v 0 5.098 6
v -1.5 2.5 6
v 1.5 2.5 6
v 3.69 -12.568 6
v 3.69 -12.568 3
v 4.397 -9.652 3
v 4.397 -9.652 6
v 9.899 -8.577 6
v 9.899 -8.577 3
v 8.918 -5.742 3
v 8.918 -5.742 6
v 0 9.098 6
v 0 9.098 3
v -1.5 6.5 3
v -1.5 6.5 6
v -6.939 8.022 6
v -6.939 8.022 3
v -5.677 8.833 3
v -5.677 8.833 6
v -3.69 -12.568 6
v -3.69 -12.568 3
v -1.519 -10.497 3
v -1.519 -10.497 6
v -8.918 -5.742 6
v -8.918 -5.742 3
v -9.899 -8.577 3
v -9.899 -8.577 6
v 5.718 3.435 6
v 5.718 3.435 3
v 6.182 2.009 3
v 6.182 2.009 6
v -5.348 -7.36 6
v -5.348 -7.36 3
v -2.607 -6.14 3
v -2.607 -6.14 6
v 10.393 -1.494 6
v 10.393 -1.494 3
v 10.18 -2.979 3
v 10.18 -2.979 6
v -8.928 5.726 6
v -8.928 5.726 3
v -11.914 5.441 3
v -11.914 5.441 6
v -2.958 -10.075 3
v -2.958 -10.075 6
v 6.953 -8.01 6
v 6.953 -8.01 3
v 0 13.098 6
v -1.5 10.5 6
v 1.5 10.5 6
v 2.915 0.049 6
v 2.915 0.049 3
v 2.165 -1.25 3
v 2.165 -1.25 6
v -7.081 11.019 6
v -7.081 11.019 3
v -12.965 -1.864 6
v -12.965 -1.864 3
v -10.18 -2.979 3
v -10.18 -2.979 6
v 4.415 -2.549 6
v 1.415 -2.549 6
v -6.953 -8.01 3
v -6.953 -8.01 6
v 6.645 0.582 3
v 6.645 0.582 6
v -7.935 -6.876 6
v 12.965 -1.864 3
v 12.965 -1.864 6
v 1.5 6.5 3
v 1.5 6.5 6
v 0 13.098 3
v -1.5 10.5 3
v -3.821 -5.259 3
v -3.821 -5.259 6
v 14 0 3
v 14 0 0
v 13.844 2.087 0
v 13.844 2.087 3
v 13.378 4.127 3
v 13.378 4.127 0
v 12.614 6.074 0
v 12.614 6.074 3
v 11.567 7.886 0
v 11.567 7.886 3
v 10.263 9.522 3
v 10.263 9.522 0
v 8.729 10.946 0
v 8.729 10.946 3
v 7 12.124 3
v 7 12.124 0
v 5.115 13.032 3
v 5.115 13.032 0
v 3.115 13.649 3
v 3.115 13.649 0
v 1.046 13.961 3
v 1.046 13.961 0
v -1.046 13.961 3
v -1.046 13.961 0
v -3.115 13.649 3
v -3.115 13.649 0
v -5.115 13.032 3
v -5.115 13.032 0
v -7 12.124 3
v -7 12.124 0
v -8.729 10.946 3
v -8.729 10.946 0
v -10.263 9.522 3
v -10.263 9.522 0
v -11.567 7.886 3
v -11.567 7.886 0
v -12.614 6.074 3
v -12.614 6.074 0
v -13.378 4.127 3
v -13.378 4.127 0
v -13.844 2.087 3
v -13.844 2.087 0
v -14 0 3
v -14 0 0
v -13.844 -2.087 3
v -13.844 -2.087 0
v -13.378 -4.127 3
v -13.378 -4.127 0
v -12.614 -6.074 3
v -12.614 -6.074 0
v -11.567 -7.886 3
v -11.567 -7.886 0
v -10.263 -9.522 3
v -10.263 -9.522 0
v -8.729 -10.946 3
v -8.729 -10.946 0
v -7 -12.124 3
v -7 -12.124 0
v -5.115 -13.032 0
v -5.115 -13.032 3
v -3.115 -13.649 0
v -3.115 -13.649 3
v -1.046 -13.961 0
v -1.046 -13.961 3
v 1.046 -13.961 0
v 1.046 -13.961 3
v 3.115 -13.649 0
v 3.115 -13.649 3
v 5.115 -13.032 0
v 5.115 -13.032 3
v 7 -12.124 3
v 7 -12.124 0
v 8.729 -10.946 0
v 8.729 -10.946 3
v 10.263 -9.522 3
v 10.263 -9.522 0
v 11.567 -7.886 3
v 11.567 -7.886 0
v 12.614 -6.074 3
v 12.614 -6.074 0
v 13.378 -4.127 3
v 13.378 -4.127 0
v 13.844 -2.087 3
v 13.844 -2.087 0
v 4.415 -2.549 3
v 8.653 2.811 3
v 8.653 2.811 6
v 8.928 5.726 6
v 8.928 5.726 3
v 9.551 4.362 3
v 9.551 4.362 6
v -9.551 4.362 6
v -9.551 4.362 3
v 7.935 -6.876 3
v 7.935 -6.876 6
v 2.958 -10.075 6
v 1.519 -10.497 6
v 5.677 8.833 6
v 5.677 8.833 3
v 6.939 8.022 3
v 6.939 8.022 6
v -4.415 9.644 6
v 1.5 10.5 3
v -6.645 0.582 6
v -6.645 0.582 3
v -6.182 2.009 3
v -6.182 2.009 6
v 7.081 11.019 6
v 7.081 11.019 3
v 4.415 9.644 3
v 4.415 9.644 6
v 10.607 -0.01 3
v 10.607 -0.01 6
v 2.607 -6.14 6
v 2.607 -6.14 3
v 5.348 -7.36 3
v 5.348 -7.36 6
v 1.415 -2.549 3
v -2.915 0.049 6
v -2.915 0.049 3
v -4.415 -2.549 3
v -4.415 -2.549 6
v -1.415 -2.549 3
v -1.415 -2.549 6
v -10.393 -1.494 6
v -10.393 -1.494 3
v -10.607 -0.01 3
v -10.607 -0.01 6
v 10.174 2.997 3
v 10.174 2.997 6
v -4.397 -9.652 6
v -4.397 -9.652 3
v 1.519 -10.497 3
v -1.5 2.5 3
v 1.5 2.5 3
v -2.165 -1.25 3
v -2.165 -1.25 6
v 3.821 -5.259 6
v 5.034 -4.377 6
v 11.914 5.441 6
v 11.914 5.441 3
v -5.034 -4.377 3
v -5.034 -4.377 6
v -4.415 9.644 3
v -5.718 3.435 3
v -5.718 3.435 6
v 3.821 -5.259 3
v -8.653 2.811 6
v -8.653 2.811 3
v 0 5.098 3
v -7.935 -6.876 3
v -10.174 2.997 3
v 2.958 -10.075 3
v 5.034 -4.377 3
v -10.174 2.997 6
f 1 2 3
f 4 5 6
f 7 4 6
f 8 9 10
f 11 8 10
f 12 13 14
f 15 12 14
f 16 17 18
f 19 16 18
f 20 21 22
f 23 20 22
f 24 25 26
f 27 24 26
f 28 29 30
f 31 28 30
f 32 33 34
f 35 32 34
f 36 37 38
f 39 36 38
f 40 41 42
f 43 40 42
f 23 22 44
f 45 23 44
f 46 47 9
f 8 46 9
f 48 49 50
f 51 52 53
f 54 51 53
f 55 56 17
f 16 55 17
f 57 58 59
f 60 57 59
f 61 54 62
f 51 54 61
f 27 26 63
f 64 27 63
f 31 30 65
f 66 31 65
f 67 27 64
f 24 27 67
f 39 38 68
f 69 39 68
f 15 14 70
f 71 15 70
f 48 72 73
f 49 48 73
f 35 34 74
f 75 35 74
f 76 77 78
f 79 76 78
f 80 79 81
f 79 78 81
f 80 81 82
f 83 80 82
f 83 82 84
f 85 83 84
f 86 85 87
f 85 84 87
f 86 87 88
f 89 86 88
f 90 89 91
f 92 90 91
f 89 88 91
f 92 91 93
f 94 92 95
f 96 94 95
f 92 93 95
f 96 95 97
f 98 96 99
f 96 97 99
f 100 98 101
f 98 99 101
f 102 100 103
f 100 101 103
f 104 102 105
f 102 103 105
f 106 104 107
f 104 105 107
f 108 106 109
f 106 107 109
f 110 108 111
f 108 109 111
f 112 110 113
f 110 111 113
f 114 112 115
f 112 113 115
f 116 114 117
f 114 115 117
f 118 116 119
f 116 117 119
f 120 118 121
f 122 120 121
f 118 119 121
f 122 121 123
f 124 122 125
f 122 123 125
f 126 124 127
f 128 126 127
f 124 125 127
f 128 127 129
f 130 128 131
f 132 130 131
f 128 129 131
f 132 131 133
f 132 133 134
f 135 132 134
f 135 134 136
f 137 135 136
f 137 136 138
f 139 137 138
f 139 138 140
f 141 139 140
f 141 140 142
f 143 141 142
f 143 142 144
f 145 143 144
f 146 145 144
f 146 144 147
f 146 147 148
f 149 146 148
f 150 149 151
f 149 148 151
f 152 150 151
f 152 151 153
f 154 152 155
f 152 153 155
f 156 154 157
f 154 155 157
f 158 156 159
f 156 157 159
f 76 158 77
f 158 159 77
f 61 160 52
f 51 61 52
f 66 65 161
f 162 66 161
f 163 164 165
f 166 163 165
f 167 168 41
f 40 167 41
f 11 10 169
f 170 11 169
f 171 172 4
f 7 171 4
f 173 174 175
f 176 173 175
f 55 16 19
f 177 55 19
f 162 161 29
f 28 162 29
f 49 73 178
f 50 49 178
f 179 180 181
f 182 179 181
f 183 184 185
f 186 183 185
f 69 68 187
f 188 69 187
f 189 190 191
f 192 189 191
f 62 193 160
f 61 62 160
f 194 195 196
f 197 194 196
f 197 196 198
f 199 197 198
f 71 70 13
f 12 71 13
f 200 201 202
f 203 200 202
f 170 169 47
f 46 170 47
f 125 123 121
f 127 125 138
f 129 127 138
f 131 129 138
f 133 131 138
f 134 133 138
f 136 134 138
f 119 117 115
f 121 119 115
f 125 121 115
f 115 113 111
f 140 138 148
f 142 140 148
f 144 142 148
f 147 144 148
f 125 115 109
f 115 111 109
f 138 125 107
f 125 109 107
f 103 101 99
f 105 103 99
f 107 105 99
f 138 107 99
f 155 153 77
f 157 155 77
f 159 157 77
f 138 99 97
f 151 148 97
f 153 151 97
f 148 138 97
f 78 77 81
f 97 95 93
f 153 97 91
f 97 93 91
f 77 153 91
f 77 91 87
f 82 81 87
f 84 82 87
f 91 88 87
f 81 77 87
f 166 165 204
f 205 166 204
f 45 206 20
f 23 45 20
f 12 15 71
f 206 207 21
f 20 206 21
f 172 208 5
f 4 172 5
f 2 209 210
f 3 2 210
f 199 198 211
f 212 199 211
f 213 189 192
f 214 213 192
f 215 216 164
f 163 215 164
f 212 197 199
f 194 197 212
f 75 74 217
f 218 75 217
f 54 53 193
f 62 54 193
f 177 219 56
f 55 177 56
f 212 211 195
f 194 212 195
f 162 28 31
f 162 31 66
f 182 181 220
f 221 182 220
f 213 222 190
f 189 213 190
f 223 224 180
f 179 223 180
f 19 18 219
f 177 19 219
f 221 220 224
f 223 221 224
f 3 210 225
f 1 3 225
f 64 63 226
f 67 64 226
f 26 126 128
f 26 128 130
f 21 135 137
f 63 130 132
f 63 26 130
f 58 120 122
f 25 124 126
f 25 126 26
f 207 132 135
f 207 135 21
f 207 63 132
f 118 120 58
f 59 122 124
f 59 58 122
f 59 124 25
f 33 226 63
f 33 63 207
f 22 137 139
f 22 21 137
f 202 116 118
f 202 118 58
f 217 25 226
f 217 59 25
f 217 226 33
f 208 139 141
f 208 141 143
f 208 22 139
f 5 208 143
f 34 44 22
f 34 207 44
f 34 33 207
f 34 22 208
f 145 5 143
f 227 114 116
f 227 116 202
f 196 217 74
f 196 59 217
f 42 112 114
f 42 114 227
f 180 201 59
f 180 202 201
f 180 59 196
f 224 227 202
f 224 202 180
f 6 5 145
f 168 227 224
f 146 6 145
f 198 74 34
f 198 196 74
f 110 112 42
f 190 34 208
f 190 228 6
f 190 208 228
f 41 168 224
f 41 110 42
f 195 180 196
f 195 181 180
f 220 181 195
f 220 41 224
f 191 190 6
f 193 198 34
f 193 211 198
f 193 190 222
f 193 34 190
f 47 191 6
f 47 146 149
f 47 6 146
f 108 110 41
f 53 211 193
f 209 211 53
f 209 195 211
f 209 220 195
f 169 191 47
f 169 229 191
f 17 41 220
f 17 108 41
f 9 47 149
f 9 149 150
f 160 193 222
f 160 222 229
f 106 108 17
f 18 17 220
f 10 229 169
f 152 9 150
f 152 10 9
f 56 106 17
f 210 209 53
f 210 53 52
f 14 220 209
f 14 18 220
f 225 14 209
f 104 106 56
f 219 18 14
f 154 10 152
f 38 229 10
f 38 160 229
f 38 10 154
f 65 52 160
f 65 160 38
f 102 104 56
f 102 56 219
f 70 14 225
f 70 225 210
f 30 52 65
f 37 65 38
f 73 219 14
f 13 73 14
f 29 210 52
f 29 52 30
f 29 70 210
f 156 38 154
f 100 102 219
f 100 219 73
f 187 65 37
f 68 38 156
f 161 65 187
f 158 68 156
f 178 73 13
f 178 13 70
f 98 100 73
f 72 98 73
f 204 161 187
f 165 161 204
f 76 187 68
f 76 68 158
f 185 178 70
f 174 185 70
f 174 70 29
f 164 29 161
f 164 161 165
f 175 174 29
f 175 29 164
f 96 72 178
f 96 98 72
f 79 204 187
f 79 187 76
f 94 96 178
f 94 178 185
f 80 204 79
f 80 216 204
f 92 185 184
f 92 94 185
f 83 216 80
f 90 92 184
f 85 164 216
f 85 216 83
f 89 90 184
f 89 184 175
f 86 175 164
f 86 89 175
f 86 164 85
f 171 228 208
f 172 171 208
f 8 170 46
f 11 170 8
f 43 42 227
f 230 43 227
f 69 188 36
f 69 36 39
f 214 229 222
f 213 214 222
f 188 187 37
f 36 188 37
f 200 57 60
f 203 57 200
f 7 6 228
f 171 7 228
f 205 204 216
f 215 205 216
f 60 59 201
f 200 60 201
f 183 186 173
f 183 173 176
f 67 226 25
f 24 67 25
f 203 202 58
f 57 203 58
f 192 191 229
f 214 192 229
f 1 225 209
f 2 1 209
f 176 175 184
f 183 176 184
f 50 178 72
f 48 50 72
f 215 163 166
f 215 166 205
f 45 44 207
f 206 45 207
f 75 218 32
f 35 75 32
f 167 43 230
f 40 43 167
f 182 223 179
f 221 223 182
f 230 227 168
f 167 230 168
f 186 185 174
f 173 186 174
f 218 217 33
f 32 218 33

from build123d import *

# Parameters (mm, degrees)
F0_R     = 14
F1_DEPTH = 3
F3_DEPTH = 3


# Not quite as in the source:
# - a feature names something its author has since deleted; it is built from what else it names


with BuildPart() as f1:
    # F0 (on Top) → F1 (new body)
    with BuildSketch(Plane.XY):
        Circle(F0_R)
    extrude(amount=F1_DEPTH)

    # F2 (on face) → F3 (join)
    with BuildSketch(Plane.XY.offset(3)):
        Polygon((0, 6.5), (1.5, 6.5), (0, 9.0980762114), (-1.5, 6.5), align=None)
        Polygon((-6.6453928475, 0.582025689), (-6.1818673809, 2.0086103865), (-5.7183418644, 3.4351952379), (-8.6527846666, 2.8114601654), align=None)
        Polygon((-2.6070786483, -6.1402883419), (-3.8206041381, -5.2586104647), (-5.0341296315, -4.376932585), (-5.3477150213, -7.3604982711), align=None)
        Polygon((-6.9386088825, 8.0222008685), (-5.6767273349, 8.833162897), (-4.414848284, 9.6441233209), (-7.08135463, 11.0188028861), align=None)
        Polygon((0, 10.5), (1.5, 10.5), (0, 13.0980762114), (-1.5, 10.5), align=None)
        Polygon((4.3974313073, -9.6520773877), (2.9581918265, -10.0746762289), (1.5189523864, -10.4972750582), (3.6901545007, -12.5675120927), align=None)
        Polygon((-1.5189523864, -10.4972750582), (-2.9581918467, -10.074676223), (-4.3974313073, -9.6520773877), (-3.6901545007, -12.5675120927), align=None)
        Polygon((-6.9530794298, -8.009662068), (-7.9353704205, -6.8760378337), (-8.9176616316, -5.7424133449), (-9.8988655216, -8.577415801), align=None)
        Polygon((-10.1796528823, -2.9790379647), (-10.3931251437, -1.4943057747), (-10.6065973972, -0.009573639), (-12.9647566814, -1.8640505977), align=None)
        Polygon((0, 2.5), (1.5, 2.5), (0, 5.0980762114), (-1.5, 2.5), align=None)
        Polygon((-1.4150635095, -2.5490381057), (-2.1650632679, -1.2500004183), (-2.9150635095, 0.0490381057), (-4.4150635095, -2.5490381057), align=None)
        Polygon((2.9150635095, 0.0490381057), (2.1650632692, -1.2500004162), (1.4150635095, -2.5490381057), (4.4150635095, -2.5490381057), align=None)
        Polygon((8.9280134317, 5.7263056296), (9.5511359728, 4.3618575893), (10.1742584707, 2.9974096435), (11.9144291994, 5.4411374996), align=None)
        Polygon((5.7183418644, 3.4351952379), (6.1818673459, 2.0086104943), (6.6453928475, 0.582025689), (8.6527846666, 2.8114601654), align=None)
        Polygon((5.0341296315, -4.376932585), (3.8206041381, -5.2586104647), (2.6070786483, -6.1402883419), (5.3477150213, -7.3604982711), align=None)
        Polygon((8.9176616316, -5.7424133449), (7.9353705512, -6.8760376828), (6.9530794298, -8.009662068), (9.8988655216, -8.577415801), align=None)
        Polygon((10.6065973972, -0.009573639), (10.3931251437, -1.4943057747), (10.1796528823, -2.9790379647), (12.9647566814, -1.8640505977), align=None)
        Polygon((-10.1742584707, 2.9974096435), (-9.551135936, 4.3618576698), (-8.9280134317, 5.7263056296), (-11.9144291994, 5.4411374996), align=None)
        Polygon((4.414848284, 9.6441233209), (5.6767273496, 8.8331628876), (6.9386088825, 8.0222008685), (7.08135463, 11.0188028861), align=None)
    extrude(amount=F3_DEPTH)


solid = f1.part
